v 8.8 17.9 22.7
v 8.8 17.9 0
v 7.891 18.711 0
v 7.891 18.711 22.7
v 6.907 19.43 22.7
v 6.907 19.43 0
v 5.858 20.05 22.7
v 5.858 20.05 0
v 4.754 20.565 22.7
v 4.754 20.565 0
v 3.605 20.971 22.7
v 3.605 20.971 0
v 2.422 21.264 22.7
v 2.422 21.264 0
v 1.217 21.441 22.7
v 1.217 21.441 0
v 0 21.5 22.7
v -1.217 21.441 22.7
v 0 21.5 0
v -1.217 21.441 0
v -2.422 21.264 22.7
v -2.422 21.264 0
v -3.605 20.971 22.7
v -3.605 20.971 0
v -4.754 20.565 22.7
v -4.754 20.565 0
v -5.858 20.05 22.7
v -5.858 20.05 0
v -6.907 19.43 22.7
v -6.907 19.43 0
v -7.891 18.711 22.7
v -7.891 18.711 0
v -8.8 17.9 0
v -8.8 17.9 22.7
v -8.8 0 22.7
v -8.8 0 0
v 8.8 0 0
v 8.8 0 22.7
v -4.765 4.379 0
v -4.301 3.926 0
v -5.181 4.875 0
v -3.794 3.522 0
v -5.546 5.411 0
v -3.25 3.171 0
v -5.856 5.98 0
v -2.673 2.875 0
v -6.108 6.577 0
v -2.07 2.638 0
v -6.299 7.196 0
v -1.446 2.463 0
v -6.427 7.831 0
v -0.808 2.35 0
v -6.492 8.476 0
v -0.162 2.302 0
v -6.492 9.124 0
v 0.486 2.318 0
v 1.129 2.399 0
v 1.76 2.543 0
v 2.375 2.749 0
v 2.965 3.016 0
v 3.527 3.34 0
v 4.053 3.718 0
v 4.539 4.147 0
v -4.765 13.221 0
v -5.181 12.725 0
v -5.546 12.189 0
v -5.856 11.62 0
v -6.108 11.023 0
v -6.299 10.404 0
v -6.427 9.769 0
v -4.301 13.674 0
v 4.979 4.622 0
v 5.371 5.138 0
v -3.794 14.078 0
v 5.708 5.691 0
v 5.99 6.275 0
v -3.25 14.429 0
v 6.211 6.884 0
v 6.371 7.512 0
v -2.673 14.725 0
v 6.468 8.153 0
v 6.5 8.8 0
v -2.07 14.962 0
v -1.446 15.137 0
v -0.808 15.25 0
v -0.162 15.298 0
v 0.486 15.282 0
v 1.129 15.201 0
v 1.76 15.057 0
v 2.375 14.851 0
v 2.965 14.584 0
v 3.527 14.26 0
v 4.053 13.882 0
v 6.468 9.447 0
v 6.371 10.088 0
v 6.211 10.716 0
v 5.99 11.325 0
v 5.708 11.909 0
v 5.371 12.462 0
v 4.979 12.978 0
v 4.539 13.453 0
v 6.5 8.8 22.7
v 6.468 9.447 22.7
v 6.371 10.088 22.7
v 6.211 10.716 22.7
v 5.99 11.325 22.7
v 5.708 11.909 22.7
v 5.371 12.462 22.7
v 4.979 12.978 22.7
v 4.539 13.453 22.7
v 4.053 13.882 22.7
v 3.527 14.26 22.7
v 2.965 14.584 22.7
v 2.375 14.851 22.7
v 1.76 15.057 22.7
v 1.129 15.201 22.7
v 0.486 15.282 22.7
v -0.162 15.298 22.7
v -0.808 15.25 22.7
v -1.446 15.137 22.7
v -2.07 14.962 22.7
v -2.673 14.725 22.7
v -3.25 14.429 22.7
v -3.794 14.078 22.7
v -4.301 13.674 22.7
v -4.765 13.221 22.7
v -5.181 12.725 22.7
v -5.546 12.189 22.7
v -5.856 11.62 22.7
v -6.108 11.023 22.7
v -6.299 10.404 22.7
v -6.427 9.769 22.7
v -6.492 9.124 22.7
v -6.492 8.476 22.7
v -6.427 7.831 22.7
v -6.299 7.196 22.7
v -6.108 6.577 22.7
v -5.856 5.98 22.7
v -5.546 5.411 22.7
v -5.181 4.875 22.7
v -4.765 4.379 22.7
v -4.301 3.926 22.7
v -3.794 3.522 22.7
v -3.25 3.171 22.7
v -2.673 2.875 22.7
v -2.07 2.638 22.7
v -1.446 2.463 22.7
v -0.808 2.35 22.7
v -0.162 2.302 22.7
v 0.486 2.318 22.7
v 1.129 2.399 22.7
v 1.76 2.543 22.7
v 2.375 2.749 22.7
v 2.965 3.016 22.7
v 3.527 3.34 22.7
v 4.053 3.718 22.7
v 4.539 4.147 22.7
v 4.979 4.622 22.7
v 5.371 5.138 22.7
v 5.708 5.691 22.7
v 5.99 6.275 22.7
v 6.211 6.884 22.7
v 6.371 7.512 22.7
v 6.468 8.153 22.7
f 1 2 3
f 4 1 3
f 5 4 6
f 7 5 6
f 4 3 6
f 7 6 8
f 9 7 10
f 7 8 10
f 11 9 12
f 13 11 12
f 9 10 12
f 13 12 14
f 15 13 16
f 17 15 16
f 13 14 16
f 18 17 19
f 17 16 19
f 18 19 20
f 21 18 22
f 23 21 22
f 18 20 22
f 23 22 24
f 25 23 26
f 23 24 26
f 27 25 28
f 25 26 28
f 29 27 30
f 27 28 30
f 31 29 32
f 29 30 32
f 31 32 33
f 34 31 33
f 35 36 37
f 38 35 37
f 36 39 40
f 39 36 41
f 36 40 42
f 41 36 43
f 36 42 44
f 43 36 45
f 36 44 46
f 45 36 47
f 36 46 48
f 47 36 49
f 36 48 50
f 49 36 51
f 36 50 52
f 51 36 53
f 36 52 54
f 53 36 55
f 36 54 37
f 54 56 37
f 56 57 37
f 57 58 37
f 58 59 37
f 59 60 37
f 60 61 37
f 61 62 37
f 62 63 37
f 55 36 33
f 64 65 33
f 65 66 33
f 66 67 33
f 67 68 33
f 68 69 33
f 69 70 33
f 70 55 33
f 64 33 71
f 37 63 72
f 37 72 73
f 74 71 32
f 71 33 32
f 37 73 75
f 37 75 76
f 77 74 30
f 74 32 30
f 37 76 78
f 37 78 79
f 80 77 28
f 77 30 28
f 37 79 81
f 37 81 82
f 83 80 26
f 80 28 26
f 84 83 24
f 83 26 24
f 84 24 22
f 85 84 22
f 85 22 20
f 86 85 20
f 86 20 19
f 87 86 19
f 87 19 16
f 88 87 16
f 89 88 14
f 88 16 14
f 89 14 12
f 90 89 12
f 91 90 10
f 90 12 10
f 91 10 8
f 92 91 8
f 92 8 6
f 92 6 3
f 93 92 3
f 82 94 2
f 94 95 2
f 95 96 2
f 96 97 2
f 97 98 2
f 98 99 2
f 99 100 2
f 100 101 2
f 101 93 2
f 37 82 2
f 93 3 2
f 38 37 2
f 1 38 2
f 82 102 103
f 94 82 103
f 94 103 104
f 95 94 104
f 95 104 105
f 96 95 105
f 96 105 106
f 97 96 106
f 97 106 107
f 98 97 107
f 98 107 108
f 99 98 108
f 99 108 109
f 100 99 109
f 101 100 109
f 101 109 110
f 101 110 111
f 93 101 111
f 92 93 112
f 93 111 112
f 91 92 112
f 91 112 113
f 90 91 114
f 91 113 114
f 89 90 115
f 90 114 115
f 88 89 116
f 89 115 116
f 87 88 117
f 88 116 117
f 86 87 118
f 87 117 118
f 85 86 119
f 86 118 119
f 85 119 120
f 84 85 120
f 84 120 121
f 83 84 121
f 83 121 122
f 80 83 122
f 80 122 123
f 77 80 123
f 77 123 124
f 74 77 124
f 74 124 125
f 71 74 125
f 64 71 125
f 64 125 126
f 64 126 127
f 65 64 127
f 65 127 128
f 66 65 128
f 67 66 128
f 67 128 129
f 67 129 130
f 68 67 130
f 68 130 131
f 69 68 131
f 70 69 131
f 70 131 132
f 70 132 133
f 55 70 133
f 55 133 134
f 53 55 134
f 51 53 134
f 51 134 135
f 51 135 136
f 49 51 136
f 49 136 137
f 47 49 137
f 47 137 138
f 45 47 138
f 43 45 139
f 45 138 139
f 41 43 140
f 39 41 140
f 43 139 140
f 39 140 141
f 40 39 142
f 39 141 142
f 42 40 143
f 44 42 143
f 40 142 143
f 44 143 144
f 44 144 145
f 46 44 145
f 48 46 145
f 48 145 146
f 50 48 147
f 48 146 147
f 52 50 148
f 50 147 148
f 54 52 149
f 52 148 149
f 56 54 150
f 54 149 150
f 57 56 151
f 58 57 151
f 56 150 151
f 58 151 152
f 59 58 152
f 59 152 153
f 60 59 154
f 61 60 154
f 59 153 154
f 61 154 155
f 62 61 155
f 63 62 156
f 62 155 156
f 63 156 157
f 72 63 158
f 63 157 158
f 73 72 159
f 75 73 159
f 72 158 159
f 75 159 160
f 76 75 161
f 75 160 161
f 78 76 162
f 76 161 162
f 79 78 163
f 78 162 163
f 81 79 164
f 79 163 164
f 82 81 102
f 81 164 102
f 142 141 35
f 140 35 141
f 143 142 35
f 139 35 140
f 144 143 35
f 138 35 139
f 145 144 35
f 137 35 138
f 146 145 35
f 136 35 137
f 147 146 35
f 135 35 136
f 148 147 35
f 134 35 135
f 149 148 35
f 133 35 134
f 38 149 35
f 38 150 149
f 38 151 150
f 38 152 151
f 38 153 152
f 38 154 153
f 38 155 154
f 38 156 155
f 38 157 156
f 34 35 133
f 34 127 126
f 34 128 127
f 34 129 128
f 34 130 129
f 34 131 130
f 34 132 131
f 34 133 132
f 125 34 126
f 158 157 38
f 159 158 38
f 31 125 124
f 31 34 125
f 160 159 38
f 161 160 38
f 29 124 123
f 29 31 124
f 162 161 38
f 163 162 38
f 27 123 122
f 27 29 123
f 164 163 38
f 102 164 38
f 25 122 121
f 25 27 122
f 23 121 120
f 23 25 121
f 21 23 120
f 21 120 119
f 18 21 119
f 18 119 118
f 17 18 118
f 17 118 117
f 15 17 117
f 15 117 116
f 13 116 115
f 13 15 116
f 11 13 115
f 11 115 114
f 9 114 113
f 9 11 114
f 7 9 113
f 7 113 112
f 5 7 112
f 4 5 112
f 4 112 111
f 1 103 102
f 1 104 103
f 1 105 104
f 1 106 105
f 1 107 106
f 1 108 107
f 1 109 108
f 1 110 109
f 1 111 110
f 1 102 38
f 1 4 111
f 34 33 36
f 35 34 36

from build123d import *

# Parameters (mm, degrees)
EXTRUDE_1_DEPTH     = 22.7
SKETCH_2_R          = 6.5
CUT_EXTRUDE_1_DEPTH = 33.480455662


with BuildPart() as part:
    # Эскиз1 → Бобышка-Вытянуть1 (new body)
    with BuildSketch(Plane.XY):
        with BuildLine():
            Line((-8.8, 0), (8.8, 0))
            Line((8.8, 0), (8.8, 17.9))
            ThreePointArc((8.8, 17.9), (0, 21.5), (-8.8, 17.9))
            Line((-8.8, 17.9), (-8.8, 0))
        make_face()
    extrude(amount=EXTRUDE_1_DEPTH)

    # Эскиз2 → Вырез-Вытянуть1 (cut, through all)
    with BuildSketch(Plane.XY.offset(22.7)):
        with Locations((0, 8.8)):
            Circle(SKETCH_2_R)
    extrude(amount=-CUT_EXTRUDE_1_DEPTH, mode=Mode.SUBTRACT)


solid = part.part
